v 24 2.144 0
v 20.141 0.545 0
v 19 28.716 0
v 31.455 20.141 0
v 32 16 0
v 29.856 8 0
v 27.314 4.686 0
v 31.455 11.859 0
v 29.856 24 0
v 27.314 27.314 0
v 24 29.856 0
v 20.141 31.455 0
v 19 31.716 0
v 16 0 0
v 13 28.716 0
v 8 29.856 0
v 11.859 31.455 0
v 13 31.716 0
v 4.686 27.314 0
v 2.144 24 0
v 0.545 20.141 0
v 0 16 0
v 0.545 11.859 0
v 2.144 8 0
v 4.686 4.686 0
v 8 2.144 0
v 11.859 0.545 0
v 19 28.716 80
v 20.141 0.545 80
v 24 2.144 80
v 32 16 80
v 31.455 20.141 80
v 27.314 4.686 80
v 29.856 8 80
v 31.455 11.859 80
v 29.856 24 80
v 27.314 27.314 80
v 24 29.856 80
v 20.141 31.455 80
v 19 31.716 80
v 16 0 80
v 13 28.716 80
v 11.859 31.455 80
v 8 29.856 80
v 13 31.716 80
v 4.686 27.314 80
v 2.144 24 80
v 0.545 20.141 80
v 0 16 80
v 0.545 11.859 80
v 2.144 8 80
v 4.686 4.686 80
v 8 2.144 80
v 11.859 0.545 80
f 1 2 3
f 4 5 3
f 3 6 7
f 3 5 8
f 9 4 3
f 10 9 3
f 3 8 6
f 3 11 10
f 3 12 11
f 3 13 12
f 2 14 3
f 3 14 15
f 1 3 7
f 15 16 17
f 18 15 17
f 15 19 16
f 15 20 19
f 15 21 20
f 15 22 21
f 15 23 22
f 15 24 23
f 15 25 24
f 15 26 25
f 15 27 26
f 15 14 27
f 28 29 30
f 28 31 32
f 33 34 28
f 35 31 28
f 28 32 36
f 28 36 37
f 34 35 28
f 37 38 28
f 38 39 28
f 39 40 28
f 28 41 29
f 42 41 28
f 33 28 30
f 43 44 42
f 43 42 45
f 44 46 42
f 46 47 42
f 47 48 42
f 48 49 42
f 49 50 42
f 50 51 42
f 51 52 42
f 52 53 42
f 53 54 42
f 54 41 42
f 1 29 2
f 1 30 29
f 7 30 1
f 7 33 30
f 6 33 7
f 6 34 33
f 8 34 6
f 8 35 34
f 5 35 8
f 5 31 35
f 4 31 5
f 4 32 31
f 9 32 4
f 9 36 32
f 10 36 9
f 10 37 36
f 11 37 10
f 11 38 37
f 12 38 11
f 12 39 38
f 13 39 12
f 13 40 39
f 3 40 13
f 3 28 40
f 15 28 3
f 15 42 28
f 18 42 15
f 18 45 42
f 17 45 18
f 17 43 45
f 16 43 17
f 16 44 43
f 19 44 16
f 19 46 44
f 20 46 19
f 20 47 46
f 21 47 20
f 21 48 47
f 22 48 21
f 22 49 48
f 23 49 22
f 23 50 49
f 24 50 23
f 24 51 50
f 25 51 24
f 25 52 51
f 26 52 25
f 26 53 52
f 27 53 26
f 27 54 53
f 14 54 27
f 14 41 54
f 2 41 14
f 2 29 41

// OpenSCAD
$fn = 32;

// ----------------------------------------------------------------------
// Keyway shaft: d32 shaft, key 6 x 3 mm
// ----------------------------------------------------------------------

// --- parameters (mm) ---
shaft_r = 16;             // shaft radius
key_w = 6;                // keyway width
key_d = 3;                // keyway depth below the surface line
plate_t = 80;             // shaft length, Z (extrusion height)

shaft_d = 2 * shaft_r;  // shaft diameter
circle_step = 15;  // polygon sampling step, degrees

profile = [[11.859, 31.455], [8, 29.856], [4.686, 27.314], [2.144, 24], [0.545, 20.141], [0, 16], [0.545, 11.859], [2.144, 8], [4.686, 4.686], [8, 2.144], [11.859, 0.545], [16, 0], [20.141, 0.545], [24, 2.144], [27.314, 4.686], [29.856, 8], [31.455, 11.859], [32, 16], [31.455, 20.141], [29.856, 24], [27.314, 27.314], [24, 29.856], [20.141, 31.455], [19, 31.716], [19, 28.716], [13, 28.716], [13, 31.716]];  // primary outline, 27 points, counter clockwise

// --- the one profile operation ---
linear_extrude(height = plate_t) polygon(points = profile);
